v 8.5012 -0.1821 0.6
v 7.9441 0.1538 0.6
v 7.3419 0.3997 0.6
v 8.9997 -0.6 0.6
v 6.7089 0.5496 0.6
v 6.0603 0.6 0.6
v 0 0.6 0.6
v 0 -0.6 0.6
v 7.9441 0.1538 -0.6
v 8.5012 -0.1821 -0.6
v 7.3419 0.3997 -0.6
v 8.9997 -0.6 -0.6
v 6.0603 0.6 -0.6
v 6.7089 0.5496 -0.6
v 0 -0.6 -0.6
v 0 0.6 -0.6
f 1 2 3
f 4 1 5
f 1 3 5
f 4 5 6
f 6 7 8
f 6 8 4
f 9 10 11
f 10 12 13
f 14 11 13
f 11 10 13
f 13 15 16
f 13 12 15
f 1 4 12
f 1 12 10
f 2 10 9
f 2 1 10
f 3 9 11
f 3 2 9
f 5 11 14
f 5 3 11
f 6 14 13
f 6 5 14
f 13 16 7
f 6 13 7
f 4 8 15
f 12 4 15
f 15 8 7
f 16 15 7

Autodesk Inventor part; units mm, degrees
ref_plane "YZ Plane" through (0, 0, 0) normal (1, 0, 0) x (0, 1, 0)
ref_plane "XZ Plane" through (0, 0, 0) normal (0, 1, 0) x (-1, 0, 0)
sketch "Sketch1" plane through (0, 0, 0) normal (1, 0, 0) x (0, 1, 0)
  line L0 (-0.6, 0.6) -> (-0.6, -0.6)
  line L1 (-0.6, -0.6) -> (0.6, -0.6)
  line L2 (0.6, -0.6) -> (0.6, 0.6)
  line L3 (0.6, 0.6) -> (-0.6, 0.6)
  line L4 (-0.6, 0.6) -> (0.6, -0.6) construction
  line L5 (-0.6, -0.6) -> (0.6, 0.6) construction
  point P0 (0, 0)
  dimension "d0" = 1.2
  dimension "d1" = 1.2
extrude "Extrusion1" add sketch "Sketch1" along normal blind 9
ref_plane "Work Plane1" through (0, -0.6, 0.6) normal (0, 0, 1) x (1, 0, 0)
sketch "Sketch2" plane through (0, -0.6, 0.6) normal (0, 0, 1) x (1, 0, 0)
  line L0 (9, 0) -> (9, 1.2) projected
  line L1 (0, 1.2) -> (9, 1.2) projected
  line L2 (9, 0) -> (9, 1.2)
  line L3 (9, 1.2) -> (7.8, 1.2)
  line L4 (7.8, 1.2) -> (9, 0)
  point P0 (0, 0.6)
  dimension "d5" = 1.2
extrude "Extrusion2" cut sketch "Sketch2" against normal blind 9
fillet "Fillet1" radius 4.2 1 edges at (7.8, 0.6, 0)
properties part number "New_ThinFinger"
